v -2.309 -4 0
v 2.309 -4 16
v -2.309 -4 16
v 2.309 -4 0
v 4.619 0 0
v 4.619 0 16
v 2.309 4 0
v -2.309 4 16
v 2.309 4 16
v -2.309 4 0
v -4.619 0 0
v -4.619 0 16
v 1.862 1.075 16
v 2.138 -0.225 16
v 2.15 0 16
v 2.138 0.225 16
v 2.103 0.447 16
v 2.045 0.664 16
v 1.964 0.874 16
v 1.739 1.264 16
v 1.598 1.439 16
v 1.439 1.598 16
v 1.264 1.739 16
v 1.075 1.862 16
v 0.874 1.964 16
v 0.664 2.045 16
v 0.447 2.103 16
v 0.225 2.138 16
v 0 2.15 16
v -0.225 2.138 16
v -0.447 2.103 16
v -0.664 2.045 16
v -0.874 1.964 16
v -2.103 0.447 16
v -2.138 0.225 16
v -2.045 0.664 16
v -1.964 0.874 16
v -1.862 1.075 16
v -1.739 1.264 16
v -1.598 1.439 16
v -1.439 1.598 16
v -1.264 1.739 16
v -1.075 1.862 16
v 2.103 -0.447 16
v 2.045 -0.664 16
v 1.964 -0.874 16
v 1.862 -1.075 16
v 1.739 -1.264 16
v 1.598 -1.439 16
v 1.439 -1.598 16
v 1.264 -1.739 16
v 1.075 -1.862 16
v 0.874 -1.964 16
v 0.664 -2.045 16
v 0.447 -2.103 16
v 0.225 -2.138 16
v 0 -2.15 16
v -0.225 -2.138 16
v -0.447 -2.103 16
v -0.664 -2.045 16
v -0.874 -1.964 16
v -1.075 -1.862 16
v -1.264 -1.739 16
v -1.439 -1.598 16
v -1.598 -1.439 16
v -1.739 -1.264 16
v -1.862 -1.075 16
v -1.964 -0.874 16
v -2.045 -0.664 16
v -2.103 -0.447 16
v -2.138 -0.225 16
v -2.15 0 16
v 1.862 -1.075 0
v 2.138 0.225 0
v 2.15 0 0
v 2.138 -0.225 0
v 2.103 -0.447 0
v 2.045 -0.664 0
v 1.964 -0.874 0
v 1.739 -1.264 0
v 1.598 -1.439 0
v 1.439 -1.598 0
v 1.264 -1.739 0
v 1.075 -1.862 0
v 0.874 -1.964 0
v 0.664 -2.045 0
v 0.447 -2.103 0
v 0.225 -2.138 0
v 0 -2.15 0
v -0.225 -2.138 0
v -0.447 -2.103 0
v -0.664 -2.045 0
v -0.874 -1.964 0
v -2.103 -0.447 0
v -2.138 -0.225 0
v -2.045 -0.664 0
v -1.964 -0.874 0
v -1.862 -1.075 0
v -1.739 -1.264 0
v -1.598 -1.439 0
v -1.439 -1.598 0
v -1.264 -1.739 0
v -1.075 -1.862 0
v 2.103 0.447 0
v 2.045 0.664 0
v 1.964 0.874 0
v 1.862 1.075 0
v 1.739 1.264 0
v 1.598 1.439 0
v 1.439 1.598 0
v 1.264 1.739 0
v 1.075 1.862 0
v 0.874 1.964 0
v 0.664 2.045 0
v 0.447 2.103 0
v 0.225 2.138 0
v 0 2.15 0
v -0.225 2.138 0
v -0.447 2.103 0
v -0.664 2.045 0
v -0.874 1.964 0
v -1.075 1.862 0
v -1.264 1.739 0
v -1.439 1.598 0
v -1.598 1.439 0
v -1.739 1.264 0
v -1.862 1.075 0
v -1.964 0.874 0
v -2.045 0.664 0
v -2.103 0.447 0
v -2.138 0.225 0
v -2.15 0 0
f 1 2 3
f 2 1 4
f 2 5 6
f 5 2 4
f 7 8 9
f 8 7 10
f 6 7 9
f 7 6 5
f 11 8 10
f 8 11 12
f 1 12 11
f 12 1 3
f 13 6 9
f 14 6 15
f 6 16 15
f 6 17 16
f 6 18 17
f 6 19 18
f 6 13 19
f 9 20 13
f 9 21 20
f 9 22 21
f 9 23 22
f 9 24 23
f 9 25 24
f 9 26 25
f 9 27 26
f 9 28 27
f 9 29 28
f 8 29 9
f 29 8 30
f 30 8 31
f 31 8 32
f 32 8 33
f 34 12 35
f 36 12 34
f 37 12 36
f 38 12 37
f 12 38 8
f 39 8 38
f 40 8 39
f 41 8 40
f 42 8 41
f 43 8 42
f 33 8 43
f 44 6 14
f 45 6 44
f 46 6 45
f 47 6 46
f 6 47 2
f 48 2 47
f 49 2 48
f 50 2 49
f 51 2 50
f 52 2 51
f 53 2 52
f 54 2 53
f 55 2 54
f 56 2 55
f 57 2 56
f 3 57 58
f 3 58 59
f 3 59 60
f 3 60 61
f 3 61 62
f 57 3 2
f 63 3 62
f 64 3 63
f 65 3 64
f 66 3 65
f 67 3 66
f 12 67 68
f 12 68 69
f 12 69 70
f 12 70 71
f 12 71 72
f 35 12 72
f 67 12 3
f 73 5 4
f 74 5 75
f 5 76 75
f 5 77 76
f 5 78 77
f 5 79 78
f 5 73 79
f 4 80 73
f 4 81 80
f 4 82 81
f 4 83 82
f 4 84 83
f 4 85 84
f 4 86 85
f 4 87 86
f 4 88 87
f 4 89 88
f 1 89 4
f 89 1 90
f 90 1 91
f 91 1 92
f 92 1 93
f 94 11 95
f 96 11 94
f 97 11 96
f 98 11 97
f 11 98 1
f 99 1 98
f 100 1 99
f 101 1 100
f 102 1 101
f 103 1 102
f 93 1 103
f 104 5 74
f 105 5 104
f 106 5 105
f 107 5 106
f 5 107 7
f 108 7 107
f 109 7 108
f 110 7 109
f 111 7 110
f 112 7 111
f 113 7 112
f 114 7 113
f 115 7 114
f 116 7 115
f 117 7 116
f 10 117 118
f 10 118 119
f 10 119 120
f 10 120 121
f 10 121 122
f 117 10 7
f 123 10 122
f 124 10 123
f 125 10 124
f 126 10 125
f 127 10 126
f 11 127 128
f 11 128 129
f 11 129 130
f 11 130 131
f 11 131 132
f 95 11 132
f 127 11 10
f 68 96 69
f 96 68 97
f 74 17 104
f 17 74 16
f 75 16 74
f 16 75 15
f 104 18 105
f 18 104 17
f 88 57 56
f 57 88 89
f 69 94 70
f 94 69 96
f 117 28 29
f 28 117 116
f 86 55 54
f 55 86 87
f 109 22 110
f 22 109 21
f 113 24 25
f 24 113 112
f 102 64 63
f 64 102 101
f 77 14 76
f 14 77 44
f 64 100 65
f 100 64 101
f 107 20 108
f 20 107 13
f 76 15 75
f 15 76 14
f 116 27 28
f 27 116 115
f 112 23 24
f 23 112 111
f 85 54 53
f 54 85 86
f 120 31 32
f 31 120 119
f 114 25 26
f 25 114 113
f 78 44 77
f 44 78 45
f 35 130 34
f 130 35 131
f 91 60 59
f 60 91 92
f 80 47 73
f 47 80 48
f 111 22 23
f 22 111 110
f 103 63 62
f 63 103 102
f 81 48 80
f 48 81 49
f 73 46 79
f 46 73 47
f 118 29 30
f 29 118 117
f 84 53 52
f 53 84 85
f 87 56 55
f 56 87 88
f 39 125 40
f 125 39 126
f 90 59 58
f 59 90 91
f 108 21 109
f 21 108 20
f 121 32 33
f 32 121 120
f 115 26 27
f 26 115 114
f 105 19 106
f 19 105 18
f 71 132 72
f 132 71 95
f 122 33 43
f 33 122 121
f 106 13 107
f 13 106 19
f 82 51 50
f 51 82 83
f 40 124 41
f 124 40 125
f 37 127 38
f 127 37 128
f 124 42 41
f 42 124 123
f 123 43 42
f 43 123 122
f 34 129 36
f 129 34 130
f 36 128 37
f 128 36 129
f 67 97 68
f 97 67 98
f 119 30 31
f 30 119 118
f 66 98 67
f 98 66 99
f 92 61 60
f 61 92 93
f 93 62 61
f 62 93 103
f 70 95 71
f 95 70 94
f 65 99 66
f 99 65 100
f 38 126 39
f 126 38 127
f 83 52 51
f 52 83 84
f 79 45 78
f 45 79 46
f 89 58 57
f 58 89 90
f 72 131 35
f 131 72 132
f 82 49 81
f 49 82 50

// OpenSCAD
// Hex standoff, 16 mm long.
$fn = 60;
eps = 0.02;
thread_d = 4.3;
flat = 8;
length = 16;
chamfer = 1.2;
difference() {
    union() {
        cylinder(d = flat / cos(30), h = length, $fn = 6);
        cylinder(d1 = flat / cos(30) - 2 * chamfer, d2 = flat / cos(30), h = chamfer, $fn = 6);
        translate([0, 0, length - chamfer]) cylinder(d1 = flat / cos(30), d2 = flat / cos(30) - 2 * chamfer, h = chamfer, $fn = 6);
    }
    translate([0, 0, -eps]) cylinder(d = thread_d, h = length + 2 * eps);
}
